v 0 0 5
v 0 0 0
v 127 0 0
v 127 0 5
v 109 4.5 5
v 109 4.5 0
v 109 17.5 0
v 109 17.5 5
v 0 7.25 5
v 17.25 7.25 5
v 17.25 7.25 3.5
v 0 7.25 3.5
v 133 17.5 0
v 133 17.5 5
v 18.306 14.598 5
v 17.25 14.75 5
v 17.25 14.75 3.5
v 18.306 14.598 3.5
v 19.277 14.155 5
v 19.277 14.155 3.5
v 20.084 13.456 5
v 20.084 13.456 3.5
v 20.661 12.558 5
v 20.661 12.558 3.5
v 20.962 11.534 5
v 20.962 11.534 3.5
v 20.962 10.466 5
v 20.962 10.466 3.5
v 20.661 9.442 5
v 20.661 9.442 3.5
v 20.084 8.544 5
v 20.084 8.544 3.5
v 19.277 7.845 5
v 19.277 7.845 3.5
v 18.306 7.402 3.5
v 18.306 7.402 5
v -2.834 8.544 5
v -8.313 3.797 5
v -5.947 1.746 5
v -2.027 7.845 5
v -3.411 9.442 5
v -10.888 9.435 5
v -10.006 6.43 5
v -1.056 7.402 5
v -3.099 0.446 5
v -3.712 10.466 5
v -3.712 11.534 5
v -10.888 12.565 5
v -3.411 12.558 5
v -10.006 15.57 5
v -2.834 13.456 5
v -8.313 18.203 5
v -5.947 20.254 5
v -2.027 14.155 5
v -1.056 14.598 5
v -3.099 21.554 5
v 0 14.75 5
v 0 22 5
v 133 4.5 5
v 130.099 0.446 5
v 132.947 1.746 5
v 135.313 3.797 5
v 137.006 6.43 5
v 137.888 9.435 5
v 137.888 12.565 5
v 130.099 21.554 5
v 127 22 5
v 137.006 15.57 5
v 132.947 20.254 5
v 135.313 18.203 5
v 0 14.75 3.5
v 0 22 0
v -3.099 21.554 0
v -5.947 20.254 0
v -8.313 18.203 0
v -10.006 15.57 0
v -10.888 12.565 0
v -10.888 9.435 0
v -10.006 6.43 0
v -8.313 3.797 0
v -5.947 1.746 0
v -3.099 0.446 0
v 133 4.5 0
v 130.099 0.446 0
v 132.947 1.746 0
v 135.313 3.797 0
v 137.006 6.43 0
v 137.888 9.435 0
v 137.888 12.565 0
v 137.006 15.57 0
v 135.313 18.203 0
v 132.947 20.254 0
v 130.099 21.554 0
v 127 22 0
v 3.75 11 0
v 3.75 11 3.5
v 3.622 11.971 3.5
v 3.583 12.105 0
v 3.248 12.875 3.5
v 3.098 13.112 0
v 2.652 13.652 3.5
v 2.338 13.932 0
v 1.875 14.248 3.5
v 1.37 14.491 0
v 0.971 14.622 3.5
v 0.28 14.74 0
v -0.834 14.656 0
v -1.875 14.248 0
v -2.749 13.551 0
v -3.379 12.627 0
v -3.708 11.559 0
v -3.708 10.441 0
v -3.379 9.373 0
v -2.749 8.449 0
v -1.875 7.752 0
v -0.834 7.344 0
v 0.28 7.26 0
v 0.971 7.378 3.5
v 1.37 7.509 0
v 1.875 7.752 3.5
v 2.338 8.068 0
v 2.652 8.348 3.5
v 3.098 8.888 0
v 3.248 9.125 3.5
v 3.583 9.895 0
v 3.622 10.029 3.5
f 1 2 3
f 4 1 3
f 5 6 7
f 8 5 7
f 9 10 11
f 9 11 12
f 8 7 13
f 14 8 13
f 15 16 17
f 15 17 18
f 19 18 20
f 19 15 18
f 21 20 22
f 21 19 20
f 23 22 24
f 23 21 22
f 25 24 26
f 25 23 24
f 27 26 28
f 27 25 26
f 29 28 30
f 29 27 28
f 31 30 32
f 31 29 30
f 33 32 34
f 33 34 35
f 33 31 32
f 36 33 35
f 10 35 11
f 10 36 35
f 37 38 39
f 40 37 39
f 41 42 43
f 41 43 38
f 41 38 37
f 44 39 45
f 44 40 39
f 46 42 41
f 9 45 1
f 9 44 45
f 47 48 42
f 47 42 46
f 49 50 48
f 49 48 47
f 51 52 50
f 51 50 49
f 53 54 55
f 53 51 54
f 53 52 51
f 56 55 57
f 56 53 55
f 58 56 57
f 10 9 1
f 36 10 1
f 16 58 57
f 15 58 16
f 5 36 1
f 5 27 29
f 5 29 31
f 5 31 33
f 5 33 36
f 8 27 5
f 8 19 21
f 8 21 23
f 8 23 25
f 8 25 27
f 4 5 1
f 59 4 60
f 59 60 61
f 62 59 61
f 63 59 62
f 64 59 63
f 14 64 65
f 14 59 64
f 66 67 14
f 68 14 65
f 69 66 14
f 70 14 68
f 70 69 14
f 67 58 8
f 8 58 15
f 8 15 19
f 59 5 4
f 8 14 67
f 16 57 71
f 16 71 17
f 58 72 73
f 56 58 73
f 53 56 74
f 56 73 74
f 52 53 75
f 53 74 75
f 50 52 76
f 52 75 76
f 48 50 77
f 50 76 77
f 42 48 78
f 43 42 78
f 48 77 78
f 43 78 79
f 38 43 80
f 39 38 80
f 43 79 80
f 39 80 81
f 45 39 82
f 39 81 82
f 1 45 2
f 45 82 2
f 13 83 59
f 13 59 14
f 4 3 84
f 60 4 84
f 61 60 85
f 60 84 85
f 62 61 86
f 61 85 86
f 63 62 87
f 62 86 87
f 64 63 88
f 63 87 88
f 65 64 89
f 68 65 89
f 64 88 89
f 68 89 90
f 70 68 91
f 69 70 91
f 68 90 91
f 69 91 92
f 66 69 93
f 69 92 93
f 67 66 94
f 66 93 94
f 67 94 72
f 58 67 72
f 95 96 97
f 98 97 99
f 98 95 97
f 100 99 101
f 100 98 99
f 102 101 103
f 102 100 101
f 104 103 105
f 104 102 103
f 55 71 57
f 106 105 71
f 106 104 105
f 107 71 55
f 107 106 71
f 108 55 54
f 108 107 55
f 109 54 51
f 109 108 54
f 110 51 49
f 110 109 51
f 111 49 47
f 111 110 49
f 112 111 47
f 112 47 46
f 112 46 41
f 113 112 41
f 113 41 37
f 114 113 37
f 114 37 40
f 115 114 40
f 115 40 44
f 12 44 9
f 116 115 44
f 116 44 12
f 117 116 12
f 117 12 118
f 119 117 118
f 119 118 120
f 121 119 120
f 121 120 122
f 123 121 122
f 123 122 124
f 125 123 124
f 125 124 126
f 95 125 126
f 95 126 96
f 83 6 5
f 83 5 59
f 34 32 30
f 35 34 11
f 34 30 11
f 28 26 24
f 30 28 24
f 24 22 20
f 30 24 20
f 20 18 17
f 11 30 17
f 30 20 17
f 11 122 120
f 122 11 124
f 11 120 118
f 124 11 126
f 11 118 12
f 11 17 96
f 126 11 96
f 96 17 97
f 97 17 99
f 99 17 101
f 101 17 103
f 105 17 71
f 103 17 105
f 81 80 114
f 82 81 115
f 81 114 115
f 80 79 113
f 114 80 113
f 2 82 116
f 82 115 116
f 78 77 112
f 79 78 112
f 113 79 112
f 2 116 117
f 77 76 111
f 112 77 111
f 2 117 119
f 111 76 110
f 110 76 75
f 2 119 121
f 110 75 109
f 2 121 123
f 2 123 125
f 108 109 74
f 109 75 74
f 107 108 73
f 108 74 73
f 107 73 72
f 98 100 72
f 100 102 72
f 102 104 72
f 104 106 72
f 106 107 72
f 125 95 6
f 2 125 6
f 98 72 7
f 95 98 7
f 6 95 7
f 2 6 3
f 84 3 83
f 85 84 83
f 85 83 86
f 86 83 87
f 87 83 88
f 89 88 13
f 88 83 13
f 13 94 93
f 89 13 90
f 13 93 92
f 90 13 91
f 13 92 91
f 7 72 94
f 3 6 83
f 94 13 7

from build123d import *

# Parameters (mm, degrees)
SKETCH1_R           = 3.75
SKETCH1_W           = 24
SKETCH1_H           = 13
BOSS_EXTRUDE1_DEPTH = 5
CUT_EXTRUDE1_DEPTH  = 1.5


with BuildPart() as part:
    # Sketch1 → Boss-Extrude1 (new body)
    with BuildSketch(Plane.XY):
        with BuildLine():
            ThreePointArc((0, 22), (-11, 11), (0, 0))
            Line((0, 0), (127, 0))
            ThreePointArc((127, 0), (138, 11), (127, 22))
            Line((127, 22), (0, 22))
        make_face()
        with Locations((0, 11)):
            Circle(SKETCH1_R, mode=Mode.SUBTRACT)
        with Locations((121, 11)):
            Rectangle(SKETCH1_W, SKETCH1_H, mode=Mode.SUBTRACT)
    extrude(amount=BOSS_EXTRUDE1_DEPTH)

    # Sketch3 → Cut-Extrude1 (cut)
    with BuildSketch(Plane.XY.offset(5)):
        with BuildLine():
            Line((0, 14.75), (17.25, 14.75))
            ThreePointArc((17.25, 14.75), (21, 11), (17.25, 7.25))
            Line((17.25, 7.25), (0, 7.25))
            ThreePointArc((0, 7.25), (3.75, 11), (0, 14.75))
        make_face()
    extrude(amount=-CUT_EXTRUDE1_DEPTH, mode=Mode.SUBTRACT)


solid = part.part
